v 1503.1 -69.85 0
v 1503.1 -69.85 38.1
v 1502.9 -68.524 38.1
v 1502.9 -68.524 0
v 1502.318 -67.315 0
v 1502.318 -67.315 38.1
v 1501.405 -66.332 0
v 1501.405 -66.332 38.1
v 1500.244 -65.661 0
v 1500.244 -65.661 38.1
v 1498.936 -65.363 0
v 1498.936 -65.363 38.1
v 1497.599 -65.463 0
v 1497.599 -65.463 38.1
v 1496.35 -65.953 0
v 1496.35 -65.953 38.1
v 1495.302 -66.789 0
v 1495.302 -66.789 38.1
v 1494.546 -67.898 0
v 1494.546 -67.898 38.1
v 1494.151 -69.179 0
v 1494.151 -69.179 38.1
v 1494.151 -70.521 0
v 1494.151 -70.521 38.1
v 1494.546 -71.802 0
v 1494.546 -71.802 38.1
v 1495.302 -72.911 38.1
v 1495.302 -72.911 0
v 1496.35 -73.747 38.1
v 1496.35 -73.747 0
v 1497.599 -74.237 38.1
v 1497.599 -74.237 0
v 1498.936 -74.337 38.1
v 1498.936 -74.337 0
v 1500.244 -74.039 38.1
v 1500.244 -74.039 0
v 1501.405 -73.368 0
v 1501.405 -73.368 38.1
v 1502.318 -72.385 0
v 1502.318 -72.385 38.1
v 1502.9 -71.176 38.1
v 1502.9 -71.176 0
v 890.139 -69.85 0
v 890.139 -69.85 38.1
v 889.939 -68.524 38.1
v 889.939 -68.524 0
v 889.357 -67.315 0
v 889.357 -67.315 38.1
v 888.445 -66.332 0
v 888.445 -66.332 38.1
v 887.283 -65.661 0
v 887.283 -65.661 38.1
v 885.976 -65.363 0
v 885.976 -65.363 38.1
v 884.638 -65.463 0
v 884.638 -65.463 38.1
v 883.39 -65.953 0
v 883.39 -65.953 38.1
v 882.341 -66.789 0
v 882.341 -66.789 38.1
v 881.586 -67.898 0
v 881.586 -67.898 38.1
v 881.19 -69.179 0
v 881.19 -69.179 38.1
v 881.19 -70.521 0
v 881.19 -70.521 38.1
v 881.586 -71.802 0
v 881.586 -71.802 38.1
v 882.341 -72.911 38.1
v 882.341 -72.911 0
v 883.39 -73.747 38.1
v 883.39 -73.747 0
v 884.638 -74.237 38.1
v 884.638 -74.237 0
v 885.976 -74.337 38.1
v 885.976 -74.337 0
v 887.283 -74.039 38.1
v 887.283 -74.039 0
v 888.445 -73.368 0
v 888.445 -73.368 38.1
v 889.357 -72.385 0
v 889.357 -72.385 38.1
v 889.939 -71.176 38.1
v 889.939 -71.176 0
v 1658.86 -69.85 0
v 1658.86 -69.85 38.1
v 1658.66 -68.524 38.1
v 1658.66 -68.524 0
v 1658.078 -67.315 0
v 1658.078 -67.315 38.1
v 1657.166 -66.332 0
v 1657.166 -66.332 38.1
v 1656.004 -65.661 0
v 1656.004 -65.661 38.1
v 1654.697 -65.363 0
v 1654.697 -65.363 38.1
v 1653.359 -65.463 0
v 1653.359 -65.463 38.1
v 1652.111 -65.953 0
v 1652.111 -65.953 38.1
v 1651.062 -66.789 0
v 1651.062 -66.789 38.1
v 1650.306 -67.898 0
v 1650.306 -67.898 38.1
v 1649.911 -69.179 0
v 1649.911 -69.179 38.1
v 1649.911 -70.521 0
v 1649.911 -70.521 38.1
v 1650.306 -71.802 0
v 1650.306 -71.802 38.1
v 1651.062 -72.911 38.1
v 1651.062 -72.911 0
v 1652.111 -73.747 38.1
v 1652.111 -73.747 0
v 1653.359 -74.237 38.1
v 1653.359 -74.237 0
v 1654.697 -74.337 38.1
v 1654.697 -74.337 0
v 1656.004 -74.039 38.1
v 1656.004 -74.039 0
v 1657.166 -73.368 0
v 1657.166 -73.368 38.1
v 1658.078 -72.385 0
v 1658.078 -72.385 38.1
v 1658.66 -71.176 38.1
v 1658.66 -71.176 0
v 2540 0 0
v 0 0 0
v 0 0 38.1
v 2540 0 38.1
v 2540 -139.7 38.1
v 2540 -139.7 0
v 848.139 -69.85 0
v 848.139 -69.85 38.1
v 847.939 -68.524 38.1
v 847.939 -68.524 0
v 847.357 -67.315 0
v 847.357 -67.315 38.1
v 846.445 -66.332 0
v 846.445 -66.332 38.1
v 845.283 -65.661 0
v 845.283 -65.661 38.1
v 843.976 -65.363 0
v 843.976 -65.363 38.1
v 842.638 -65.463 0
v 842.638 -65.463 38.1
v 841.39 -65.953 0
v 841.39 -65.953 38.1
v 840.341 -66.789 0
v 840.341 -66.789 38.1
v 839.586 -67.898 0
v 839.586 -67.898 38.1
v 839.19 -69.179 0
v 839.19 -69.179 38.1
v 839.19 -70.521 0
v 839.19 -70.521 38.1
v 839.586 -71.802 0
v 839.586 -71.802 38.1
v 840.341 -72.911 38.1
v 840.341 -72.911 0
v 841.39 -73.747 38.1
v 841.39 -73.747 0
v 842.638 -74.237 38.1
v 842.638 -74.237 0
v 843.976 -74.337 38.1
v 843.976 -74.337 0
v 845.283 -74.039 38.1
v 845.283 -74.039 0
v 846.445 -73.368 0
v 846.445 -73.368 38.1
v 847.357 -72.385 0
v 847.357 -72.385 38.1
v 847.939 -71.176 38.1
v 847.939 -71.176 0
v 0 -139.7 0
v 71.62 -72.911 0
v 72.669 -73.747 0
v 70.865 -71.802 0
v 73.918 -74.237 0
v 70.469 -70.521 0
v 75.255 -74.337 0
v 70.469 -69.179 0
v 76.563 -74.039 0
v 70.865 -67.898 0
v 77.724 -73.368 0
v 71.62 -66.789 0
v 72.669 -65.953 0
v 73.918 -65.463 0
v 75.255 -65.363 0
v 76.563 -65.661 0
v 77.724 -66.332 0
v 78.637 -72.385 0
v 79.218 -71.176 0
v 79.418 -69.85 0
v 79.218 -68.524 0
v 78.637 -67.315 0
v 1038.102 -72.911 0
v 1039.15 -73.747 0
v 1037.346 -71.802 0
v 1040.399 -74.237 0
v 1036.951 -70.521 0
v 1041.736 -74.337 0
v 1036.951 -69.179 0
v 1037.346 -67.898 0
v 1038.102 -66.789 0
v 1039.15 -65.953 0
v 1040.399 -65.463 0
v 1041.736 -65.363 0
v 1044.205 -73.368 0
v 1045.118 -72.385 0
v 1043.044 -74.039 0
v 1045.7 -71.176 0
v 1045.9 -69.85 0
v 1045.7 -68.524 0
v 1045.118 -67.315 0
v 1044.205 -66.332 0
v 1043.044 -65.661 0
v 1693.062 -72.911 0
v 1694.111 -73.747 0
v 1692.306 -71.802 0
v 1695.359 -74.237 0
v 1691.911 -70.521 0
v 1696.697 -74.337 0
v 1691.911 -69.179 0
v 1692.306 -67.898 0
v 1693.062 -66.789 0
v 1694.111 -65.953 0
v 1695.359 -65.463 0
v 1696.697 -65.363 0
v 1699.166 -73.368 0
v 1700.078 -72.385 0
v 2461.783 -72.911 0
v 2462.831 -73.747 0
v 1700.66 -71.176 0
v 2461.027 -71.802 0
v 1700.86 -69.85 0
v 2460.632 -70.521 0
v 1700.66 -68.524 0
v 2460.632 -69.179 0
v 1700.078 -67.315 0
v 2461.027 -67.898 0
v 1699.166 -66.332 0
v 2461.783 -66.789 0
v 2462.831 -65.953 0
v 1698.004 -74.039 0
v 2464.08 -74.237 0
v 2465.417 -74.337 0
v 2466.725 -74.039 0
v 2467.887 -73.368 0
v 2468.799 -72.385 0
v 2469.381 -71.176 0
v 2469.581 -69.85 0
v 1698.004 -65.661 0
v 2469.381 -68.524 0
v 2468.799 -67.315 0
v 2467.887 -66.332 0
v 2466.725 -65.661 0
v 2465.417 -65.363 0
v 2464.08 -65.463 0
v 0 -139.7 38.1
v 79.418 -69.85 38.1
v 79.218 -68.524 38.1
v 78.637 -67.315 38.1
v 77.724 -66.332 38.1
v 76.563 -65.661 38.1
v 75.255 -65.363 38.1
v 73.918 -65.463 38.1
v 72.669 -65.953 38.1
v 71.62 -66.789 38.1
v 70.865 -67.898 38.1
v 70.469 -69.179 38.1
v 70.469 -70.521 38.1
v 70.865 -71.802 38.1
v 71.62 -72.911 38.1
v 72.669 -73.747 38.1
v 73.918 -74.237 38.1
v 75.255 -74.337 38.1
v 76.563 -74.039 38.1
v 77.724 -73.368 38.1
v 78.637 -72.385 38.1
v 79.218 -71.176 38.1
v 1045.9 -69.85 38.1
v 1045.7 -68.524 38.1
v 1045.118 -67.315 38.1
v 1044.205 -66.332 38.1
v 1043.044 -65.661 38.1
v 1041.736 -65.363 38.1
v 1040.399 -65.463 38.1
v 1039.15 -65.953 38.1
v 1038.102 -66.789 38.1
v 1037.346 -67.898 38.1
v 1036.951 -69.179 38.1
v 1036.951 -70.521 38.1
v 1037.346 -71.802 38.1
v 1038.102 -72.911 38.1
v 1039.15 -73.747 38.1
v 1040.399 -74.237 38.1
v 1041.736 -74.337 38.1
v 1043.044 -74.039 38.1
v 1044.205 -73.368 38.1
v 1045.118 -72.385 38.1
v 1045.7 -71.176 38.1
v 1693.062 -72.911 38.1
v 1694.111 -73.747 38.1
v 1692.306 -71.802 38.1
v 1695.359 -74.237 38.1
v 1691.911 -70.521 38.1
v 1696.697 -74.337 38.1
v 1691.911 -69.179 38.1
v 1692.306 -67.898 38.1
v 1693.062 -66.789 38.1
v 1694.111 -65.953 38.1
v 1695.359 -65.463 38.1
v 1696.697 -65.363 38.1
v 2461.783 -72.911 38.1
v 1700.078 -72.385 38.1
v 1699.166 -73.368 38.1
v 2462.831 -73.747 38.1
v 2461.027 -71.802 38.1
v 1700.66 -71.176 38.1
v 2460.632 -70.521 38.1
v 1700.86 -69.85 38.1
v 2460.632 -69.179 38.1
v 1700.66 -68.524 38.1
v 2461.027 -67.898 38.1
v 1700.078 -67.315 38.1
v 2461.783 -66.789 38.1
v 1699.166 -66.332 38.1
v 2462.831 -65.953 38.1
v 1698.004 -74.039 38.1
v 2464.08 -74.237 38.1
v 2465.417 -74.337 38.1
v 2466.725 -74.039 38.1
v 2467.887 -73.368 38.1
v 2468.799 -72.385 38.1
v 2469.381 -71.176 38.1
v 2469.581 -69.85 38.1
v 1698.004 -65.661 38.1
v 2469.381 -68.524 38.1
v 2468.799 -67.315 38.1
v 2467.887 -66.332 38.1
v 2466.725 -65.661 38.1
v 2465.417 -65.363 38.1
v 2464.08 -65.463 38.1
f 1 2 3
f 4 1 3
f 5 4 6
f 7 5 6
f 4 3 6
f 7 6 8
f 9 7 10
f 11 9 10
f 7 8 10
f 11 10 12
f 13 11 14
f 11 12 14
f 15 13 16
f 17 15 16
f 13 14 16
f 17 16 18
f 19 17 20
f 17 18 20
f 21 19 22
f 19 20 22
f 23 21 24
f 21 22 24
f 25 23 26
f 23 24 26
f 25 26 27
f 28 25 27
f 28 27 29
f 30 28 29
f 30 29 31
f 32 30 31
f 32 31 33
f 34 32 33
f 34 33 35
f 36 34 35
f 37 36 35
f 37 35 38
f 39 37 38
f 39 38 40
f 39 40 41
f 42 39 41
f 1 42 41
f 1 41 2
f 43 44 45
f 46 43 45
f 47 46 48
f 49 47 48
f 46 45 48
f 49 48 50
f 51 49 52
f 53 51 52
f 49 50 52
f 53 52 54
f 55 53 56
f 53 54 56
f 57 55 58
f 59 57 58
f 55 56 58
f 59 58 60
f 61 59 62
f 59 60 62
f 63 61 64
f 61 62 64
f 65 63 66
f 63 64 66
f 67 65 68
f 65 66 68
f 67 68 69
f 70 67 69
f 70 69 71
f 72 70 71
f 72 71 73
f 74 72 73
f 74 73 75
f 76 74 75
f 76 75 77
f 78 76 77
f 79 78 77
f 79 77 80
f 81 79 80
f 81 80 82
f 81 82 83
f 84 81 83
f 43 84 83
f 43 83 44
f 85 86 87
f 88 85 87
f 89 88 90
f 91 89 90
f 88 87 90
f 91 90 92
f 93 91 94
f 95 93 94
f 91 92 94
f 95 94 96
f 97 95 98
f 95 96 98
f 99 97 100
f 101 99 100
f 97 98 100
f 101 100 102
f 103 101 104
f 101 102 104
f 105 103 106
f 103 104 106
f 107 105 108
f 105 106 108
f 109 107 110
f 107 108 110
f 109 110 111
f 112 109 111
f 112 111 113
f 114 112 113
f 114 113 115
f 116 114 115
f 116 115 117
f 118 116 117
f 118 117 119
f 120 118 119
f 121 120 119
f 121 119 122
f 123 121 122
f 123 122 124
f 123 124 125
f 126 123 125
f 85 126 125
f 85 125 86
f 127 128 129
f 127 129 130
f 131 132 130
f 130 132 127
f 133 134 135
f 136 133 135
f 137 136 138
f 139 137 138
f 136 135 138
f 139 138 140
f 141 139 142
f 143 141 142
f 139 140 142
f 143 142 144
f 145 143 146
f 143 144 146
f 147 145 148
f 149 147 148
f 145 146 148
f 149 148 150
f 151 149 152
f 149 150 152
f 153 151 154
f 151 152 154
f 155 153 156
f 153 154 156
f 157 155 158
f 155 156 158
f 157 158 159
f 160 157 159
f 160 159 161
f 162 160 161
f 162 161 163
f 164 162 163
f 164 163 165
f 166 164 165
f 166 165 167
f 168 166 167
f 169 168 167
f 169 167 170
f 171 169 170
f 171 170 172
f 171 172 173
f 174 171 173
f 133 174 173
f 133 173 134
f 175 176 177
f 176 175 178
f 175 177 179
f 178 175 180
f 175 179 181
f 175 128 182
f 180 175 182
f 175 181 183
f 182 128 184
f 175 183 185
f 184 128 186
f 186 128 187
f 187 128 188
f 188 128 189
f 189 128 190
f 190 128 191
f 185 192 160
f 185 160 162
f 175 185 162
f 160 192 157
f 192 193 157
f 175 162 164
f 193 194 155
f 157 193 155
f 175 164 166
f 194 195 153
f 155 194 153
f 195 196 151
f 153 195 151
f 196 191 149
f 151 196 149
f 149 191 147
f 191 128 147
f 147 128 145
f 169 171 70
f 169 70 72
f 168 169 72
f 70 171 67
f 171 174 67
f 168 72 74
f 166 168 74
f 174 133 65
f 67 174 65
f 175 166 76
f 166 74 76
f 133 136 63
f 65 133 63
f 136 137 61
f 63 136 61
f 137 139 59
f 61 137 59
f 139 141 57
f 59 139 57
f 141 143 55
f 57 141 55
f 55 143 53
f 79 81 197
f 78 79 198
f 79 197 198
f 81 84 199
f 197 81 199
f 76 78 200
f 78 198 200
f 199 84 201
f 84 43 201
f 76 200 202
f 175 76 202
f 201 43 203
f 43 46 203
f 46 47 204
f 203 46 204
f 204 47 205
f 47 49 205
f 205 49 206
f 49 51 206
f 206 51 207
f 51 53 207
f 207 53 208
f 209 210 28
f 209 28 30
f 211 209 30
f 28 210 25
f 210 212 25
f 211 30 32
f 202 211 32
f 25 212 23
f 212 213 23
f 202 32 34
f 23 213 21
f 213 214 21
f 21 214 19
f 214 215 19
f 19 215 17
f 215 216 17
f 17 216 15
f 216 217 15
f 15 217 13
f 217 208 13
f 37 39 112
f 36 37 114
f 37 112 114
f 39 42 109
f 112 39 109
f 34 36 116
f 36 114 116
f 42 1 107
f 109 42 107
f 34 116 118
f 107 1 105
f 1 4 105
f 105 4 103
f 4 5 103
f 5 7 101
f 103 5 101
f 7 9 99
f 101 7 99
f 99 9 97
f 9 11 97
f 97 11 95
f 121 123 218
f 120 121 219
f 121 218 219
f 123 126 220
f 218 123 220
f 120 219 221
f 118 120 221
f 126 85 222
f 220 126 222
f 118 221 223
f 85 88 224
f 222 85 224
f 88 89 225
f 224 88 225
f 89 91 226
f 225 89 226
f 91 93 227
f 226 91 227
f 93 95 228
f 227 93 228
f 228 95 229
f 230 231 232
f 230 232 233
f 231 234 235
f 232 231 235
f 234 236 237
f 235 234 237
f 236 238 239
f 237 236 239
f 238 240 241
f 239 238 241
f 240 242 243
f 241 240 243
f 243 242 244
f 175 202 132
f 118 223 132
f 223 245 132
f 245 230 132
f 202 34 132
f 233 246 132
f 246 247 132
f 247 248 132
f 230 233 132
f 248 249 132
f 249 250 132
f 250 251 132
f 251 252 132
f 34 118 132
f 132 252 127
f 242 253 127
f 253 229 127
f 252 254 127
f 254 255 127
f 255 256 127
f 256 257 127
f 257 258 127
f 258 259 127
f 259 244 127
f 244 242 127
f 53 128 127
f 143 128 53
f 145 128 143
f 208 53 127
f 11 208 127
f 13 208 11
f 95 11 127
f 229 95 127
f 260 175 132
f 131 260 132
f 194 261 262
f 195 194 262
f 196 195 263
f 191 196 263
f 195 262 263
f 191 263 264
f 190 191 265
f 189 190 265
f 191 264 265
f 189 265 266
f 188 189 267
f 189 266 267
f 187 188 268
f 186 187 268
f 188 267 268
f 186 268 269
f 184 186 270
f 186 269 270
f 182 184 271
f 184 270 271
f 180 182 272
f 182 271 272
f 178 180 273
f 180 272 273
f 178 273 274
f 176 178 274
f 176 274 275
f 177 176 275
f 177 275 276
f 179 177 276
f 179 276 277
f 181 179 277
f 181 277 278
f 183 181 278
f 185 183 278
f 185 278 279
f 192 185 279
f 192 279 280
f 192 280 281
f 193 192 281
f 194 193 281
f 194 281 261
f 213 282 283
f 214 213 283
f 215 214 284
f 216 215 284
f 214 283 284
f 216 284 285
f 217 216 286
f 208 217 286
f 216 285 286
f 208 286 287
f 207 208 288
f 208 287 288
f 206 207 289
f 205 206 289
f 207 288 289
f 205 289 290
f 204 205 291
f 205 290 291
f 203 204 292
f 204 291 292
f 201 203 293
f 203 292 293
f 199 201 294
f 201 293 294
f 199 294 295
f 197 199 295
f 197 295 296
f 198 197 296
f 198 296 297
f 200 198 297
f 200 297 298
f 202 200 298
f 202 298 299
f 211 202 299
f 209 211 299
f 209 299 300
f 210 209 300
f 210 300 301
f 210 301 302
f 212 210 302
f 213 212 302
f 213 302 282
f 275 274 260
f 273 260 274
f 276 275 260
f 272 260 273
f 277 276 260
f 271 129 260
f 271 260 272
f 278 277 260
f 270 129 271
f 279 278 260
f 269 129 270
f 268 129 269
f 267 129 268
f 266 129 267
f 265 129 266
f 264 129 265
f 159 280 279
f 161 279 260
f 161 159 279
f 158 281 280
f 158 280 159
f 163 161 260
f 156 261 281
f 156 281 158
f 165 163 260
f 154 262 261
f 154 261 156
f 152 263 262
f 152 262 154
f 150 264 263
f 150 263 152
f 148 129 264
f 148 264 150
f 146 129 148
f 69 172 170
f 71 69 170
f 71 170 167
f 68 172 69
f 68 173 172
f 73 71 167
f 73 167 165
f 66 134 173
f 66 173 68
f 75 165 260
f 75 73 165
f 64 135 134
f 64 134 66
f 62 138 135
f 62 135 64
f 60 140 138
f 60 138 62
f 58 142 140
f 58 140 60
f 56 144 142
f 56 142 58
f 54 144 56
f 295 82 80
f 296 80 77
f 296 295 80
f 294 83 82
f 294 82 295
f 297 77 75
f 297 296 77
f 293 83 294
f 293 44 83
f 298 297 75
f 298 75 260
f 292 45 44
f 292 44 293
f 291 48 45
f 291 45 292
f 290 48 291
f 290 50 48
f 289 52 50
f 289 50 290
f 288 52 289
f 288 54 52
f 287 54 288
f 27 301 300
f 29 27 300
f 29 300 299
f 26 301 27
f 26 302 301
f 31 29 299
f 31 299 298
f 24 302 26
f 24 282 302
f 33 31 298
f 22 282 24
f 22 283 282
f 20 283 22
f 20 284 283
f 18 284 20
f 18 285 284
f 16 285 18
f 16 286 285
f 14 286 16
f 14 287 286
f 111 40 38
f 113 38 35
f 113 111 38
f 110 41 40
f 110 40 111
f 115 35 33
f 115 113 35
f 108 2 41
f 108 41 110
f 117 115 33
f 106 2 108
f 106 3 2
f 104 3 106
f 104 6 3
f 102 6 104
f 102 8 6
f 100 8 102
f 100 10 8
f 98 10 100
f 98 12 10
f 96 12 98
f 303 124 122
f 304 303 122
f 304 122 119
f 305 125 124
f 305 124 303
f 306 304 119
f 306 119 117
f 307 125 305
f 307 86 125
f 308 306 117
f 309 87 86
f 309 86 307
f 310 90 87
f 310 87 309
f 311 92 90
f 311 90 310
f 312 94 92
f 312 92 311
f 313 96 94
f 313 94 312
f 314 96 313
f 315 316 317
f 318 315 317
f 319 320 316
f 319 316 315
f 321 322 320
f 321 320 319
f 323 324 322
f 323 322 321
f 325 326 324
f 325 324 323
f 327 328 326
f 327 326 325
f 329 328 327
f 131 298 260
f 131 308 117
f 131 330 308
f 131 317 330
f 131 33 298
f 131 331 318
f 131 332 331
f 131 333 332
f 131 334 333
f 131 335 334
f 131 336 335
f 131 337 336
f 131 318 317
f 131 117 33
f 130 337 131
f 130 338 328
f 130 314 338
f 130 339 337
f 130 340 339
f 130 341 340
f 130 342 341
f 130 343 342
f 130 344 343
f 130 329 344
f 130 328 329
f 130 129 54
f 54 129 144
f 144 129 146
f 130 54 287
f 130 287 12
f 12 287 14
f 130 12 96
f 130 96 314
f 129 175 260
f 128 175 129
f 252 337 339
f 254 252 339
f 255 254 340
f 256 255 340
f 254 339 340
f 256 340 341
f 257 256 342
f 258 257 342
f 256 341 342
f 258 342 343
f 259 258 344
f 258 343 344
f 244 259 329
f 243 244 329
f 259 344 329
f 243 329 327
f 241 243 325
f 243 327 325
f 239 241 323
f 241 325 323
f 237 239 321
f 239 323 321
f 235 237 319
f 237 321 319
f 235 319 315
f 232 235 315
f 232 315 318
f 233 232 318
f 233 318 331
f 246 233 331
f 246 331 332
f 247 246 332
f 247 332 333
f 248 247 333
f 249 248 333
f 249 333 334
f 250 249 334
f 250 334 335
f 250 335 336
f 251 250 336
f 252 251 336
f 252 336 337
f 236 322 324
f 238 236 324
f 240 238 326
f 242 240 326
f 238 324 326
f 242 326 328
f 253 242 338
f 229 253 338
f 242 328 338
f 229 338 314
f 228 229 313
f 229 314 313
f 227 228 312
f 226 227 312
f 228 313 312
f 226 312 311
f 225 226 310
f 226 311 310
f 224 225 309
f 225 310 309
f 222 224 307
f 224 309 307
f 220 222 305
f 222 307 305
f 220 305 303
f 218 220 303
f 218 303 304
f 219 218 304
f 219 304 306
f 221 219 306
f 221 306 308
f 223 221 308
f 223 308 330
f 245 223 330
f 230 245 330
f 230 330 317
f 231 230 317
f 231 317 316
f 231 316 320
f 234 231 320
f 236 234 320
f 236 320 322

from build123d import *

# Parameters (mm, degrees)
SKETCH1_W                                    = 2540
SKETCH1_H                                    = 139.7
BOSS_EXTRUDE1_DEPTH                          = 38.1
SKETCH5_R                                    = 4.49961
HINGE_AND_MIDDLE_PANEL_BOLT_THRU_HOLES_DEPTH = 2545.124151845
SKETCH7_R                                    = 4.4996
CUT_EXTRUDE2_DEPTH                           = 2545.124151845


with BuildPart() as part:
    # Sketch1 → Boss-Extrude1 (new body)
    with BuildSketch(Plane.XY):
        with Locations((1270, -69.85)):
            Rectangle(SKETCH1_W, SKETCH1_H)
    extrude(amount=BOSS_EXTRUDE1_DEPTH)

    # Sketch5 → hinge and middle panel bolt thru holes (cut, through all)
    with BuildSketch(Plane.XY.offset(38.1)):
        with Locations((1654.36042, -69.85)):
            Circle(SKETCH5_R)
        with Locations((885.63958, -69.85)):
            Circle(SKETCH5_R)
        with Locations((1041.4, -69.85)):
            Circle(SKETCH5_R)
        with Locations((1498.6, -69.85)):
            Circle(SKETCH5_R)
    extrude(amount=-HINGE_AND_MIDDLE_PANEL_BOLT_THRU_HOLES_DEPTH, mode=Mode.SUBTRACT)

    # Sketch7 → Cut-Extrude2 (cut, through all)
    with BuildSketch(Plane.XY.offset(38.1)):
        with Locations((1696.36042, -69.85)):
            Circle(SKETCH7_R)
        with Locations((2465.08122, -69.85)):
            Circle(SKETCH7_R)
        with Locations((74.91878, -69.85)):
            Circle(SKETCH7_R)
        with Locations((843.63958, -69.85)):
            Circle(SKETCH7_R)
    extrude(amount=-CUT_EXTRUDE2_DEPTH, mode=Mode.SUBTRACT)


solid = part.part
